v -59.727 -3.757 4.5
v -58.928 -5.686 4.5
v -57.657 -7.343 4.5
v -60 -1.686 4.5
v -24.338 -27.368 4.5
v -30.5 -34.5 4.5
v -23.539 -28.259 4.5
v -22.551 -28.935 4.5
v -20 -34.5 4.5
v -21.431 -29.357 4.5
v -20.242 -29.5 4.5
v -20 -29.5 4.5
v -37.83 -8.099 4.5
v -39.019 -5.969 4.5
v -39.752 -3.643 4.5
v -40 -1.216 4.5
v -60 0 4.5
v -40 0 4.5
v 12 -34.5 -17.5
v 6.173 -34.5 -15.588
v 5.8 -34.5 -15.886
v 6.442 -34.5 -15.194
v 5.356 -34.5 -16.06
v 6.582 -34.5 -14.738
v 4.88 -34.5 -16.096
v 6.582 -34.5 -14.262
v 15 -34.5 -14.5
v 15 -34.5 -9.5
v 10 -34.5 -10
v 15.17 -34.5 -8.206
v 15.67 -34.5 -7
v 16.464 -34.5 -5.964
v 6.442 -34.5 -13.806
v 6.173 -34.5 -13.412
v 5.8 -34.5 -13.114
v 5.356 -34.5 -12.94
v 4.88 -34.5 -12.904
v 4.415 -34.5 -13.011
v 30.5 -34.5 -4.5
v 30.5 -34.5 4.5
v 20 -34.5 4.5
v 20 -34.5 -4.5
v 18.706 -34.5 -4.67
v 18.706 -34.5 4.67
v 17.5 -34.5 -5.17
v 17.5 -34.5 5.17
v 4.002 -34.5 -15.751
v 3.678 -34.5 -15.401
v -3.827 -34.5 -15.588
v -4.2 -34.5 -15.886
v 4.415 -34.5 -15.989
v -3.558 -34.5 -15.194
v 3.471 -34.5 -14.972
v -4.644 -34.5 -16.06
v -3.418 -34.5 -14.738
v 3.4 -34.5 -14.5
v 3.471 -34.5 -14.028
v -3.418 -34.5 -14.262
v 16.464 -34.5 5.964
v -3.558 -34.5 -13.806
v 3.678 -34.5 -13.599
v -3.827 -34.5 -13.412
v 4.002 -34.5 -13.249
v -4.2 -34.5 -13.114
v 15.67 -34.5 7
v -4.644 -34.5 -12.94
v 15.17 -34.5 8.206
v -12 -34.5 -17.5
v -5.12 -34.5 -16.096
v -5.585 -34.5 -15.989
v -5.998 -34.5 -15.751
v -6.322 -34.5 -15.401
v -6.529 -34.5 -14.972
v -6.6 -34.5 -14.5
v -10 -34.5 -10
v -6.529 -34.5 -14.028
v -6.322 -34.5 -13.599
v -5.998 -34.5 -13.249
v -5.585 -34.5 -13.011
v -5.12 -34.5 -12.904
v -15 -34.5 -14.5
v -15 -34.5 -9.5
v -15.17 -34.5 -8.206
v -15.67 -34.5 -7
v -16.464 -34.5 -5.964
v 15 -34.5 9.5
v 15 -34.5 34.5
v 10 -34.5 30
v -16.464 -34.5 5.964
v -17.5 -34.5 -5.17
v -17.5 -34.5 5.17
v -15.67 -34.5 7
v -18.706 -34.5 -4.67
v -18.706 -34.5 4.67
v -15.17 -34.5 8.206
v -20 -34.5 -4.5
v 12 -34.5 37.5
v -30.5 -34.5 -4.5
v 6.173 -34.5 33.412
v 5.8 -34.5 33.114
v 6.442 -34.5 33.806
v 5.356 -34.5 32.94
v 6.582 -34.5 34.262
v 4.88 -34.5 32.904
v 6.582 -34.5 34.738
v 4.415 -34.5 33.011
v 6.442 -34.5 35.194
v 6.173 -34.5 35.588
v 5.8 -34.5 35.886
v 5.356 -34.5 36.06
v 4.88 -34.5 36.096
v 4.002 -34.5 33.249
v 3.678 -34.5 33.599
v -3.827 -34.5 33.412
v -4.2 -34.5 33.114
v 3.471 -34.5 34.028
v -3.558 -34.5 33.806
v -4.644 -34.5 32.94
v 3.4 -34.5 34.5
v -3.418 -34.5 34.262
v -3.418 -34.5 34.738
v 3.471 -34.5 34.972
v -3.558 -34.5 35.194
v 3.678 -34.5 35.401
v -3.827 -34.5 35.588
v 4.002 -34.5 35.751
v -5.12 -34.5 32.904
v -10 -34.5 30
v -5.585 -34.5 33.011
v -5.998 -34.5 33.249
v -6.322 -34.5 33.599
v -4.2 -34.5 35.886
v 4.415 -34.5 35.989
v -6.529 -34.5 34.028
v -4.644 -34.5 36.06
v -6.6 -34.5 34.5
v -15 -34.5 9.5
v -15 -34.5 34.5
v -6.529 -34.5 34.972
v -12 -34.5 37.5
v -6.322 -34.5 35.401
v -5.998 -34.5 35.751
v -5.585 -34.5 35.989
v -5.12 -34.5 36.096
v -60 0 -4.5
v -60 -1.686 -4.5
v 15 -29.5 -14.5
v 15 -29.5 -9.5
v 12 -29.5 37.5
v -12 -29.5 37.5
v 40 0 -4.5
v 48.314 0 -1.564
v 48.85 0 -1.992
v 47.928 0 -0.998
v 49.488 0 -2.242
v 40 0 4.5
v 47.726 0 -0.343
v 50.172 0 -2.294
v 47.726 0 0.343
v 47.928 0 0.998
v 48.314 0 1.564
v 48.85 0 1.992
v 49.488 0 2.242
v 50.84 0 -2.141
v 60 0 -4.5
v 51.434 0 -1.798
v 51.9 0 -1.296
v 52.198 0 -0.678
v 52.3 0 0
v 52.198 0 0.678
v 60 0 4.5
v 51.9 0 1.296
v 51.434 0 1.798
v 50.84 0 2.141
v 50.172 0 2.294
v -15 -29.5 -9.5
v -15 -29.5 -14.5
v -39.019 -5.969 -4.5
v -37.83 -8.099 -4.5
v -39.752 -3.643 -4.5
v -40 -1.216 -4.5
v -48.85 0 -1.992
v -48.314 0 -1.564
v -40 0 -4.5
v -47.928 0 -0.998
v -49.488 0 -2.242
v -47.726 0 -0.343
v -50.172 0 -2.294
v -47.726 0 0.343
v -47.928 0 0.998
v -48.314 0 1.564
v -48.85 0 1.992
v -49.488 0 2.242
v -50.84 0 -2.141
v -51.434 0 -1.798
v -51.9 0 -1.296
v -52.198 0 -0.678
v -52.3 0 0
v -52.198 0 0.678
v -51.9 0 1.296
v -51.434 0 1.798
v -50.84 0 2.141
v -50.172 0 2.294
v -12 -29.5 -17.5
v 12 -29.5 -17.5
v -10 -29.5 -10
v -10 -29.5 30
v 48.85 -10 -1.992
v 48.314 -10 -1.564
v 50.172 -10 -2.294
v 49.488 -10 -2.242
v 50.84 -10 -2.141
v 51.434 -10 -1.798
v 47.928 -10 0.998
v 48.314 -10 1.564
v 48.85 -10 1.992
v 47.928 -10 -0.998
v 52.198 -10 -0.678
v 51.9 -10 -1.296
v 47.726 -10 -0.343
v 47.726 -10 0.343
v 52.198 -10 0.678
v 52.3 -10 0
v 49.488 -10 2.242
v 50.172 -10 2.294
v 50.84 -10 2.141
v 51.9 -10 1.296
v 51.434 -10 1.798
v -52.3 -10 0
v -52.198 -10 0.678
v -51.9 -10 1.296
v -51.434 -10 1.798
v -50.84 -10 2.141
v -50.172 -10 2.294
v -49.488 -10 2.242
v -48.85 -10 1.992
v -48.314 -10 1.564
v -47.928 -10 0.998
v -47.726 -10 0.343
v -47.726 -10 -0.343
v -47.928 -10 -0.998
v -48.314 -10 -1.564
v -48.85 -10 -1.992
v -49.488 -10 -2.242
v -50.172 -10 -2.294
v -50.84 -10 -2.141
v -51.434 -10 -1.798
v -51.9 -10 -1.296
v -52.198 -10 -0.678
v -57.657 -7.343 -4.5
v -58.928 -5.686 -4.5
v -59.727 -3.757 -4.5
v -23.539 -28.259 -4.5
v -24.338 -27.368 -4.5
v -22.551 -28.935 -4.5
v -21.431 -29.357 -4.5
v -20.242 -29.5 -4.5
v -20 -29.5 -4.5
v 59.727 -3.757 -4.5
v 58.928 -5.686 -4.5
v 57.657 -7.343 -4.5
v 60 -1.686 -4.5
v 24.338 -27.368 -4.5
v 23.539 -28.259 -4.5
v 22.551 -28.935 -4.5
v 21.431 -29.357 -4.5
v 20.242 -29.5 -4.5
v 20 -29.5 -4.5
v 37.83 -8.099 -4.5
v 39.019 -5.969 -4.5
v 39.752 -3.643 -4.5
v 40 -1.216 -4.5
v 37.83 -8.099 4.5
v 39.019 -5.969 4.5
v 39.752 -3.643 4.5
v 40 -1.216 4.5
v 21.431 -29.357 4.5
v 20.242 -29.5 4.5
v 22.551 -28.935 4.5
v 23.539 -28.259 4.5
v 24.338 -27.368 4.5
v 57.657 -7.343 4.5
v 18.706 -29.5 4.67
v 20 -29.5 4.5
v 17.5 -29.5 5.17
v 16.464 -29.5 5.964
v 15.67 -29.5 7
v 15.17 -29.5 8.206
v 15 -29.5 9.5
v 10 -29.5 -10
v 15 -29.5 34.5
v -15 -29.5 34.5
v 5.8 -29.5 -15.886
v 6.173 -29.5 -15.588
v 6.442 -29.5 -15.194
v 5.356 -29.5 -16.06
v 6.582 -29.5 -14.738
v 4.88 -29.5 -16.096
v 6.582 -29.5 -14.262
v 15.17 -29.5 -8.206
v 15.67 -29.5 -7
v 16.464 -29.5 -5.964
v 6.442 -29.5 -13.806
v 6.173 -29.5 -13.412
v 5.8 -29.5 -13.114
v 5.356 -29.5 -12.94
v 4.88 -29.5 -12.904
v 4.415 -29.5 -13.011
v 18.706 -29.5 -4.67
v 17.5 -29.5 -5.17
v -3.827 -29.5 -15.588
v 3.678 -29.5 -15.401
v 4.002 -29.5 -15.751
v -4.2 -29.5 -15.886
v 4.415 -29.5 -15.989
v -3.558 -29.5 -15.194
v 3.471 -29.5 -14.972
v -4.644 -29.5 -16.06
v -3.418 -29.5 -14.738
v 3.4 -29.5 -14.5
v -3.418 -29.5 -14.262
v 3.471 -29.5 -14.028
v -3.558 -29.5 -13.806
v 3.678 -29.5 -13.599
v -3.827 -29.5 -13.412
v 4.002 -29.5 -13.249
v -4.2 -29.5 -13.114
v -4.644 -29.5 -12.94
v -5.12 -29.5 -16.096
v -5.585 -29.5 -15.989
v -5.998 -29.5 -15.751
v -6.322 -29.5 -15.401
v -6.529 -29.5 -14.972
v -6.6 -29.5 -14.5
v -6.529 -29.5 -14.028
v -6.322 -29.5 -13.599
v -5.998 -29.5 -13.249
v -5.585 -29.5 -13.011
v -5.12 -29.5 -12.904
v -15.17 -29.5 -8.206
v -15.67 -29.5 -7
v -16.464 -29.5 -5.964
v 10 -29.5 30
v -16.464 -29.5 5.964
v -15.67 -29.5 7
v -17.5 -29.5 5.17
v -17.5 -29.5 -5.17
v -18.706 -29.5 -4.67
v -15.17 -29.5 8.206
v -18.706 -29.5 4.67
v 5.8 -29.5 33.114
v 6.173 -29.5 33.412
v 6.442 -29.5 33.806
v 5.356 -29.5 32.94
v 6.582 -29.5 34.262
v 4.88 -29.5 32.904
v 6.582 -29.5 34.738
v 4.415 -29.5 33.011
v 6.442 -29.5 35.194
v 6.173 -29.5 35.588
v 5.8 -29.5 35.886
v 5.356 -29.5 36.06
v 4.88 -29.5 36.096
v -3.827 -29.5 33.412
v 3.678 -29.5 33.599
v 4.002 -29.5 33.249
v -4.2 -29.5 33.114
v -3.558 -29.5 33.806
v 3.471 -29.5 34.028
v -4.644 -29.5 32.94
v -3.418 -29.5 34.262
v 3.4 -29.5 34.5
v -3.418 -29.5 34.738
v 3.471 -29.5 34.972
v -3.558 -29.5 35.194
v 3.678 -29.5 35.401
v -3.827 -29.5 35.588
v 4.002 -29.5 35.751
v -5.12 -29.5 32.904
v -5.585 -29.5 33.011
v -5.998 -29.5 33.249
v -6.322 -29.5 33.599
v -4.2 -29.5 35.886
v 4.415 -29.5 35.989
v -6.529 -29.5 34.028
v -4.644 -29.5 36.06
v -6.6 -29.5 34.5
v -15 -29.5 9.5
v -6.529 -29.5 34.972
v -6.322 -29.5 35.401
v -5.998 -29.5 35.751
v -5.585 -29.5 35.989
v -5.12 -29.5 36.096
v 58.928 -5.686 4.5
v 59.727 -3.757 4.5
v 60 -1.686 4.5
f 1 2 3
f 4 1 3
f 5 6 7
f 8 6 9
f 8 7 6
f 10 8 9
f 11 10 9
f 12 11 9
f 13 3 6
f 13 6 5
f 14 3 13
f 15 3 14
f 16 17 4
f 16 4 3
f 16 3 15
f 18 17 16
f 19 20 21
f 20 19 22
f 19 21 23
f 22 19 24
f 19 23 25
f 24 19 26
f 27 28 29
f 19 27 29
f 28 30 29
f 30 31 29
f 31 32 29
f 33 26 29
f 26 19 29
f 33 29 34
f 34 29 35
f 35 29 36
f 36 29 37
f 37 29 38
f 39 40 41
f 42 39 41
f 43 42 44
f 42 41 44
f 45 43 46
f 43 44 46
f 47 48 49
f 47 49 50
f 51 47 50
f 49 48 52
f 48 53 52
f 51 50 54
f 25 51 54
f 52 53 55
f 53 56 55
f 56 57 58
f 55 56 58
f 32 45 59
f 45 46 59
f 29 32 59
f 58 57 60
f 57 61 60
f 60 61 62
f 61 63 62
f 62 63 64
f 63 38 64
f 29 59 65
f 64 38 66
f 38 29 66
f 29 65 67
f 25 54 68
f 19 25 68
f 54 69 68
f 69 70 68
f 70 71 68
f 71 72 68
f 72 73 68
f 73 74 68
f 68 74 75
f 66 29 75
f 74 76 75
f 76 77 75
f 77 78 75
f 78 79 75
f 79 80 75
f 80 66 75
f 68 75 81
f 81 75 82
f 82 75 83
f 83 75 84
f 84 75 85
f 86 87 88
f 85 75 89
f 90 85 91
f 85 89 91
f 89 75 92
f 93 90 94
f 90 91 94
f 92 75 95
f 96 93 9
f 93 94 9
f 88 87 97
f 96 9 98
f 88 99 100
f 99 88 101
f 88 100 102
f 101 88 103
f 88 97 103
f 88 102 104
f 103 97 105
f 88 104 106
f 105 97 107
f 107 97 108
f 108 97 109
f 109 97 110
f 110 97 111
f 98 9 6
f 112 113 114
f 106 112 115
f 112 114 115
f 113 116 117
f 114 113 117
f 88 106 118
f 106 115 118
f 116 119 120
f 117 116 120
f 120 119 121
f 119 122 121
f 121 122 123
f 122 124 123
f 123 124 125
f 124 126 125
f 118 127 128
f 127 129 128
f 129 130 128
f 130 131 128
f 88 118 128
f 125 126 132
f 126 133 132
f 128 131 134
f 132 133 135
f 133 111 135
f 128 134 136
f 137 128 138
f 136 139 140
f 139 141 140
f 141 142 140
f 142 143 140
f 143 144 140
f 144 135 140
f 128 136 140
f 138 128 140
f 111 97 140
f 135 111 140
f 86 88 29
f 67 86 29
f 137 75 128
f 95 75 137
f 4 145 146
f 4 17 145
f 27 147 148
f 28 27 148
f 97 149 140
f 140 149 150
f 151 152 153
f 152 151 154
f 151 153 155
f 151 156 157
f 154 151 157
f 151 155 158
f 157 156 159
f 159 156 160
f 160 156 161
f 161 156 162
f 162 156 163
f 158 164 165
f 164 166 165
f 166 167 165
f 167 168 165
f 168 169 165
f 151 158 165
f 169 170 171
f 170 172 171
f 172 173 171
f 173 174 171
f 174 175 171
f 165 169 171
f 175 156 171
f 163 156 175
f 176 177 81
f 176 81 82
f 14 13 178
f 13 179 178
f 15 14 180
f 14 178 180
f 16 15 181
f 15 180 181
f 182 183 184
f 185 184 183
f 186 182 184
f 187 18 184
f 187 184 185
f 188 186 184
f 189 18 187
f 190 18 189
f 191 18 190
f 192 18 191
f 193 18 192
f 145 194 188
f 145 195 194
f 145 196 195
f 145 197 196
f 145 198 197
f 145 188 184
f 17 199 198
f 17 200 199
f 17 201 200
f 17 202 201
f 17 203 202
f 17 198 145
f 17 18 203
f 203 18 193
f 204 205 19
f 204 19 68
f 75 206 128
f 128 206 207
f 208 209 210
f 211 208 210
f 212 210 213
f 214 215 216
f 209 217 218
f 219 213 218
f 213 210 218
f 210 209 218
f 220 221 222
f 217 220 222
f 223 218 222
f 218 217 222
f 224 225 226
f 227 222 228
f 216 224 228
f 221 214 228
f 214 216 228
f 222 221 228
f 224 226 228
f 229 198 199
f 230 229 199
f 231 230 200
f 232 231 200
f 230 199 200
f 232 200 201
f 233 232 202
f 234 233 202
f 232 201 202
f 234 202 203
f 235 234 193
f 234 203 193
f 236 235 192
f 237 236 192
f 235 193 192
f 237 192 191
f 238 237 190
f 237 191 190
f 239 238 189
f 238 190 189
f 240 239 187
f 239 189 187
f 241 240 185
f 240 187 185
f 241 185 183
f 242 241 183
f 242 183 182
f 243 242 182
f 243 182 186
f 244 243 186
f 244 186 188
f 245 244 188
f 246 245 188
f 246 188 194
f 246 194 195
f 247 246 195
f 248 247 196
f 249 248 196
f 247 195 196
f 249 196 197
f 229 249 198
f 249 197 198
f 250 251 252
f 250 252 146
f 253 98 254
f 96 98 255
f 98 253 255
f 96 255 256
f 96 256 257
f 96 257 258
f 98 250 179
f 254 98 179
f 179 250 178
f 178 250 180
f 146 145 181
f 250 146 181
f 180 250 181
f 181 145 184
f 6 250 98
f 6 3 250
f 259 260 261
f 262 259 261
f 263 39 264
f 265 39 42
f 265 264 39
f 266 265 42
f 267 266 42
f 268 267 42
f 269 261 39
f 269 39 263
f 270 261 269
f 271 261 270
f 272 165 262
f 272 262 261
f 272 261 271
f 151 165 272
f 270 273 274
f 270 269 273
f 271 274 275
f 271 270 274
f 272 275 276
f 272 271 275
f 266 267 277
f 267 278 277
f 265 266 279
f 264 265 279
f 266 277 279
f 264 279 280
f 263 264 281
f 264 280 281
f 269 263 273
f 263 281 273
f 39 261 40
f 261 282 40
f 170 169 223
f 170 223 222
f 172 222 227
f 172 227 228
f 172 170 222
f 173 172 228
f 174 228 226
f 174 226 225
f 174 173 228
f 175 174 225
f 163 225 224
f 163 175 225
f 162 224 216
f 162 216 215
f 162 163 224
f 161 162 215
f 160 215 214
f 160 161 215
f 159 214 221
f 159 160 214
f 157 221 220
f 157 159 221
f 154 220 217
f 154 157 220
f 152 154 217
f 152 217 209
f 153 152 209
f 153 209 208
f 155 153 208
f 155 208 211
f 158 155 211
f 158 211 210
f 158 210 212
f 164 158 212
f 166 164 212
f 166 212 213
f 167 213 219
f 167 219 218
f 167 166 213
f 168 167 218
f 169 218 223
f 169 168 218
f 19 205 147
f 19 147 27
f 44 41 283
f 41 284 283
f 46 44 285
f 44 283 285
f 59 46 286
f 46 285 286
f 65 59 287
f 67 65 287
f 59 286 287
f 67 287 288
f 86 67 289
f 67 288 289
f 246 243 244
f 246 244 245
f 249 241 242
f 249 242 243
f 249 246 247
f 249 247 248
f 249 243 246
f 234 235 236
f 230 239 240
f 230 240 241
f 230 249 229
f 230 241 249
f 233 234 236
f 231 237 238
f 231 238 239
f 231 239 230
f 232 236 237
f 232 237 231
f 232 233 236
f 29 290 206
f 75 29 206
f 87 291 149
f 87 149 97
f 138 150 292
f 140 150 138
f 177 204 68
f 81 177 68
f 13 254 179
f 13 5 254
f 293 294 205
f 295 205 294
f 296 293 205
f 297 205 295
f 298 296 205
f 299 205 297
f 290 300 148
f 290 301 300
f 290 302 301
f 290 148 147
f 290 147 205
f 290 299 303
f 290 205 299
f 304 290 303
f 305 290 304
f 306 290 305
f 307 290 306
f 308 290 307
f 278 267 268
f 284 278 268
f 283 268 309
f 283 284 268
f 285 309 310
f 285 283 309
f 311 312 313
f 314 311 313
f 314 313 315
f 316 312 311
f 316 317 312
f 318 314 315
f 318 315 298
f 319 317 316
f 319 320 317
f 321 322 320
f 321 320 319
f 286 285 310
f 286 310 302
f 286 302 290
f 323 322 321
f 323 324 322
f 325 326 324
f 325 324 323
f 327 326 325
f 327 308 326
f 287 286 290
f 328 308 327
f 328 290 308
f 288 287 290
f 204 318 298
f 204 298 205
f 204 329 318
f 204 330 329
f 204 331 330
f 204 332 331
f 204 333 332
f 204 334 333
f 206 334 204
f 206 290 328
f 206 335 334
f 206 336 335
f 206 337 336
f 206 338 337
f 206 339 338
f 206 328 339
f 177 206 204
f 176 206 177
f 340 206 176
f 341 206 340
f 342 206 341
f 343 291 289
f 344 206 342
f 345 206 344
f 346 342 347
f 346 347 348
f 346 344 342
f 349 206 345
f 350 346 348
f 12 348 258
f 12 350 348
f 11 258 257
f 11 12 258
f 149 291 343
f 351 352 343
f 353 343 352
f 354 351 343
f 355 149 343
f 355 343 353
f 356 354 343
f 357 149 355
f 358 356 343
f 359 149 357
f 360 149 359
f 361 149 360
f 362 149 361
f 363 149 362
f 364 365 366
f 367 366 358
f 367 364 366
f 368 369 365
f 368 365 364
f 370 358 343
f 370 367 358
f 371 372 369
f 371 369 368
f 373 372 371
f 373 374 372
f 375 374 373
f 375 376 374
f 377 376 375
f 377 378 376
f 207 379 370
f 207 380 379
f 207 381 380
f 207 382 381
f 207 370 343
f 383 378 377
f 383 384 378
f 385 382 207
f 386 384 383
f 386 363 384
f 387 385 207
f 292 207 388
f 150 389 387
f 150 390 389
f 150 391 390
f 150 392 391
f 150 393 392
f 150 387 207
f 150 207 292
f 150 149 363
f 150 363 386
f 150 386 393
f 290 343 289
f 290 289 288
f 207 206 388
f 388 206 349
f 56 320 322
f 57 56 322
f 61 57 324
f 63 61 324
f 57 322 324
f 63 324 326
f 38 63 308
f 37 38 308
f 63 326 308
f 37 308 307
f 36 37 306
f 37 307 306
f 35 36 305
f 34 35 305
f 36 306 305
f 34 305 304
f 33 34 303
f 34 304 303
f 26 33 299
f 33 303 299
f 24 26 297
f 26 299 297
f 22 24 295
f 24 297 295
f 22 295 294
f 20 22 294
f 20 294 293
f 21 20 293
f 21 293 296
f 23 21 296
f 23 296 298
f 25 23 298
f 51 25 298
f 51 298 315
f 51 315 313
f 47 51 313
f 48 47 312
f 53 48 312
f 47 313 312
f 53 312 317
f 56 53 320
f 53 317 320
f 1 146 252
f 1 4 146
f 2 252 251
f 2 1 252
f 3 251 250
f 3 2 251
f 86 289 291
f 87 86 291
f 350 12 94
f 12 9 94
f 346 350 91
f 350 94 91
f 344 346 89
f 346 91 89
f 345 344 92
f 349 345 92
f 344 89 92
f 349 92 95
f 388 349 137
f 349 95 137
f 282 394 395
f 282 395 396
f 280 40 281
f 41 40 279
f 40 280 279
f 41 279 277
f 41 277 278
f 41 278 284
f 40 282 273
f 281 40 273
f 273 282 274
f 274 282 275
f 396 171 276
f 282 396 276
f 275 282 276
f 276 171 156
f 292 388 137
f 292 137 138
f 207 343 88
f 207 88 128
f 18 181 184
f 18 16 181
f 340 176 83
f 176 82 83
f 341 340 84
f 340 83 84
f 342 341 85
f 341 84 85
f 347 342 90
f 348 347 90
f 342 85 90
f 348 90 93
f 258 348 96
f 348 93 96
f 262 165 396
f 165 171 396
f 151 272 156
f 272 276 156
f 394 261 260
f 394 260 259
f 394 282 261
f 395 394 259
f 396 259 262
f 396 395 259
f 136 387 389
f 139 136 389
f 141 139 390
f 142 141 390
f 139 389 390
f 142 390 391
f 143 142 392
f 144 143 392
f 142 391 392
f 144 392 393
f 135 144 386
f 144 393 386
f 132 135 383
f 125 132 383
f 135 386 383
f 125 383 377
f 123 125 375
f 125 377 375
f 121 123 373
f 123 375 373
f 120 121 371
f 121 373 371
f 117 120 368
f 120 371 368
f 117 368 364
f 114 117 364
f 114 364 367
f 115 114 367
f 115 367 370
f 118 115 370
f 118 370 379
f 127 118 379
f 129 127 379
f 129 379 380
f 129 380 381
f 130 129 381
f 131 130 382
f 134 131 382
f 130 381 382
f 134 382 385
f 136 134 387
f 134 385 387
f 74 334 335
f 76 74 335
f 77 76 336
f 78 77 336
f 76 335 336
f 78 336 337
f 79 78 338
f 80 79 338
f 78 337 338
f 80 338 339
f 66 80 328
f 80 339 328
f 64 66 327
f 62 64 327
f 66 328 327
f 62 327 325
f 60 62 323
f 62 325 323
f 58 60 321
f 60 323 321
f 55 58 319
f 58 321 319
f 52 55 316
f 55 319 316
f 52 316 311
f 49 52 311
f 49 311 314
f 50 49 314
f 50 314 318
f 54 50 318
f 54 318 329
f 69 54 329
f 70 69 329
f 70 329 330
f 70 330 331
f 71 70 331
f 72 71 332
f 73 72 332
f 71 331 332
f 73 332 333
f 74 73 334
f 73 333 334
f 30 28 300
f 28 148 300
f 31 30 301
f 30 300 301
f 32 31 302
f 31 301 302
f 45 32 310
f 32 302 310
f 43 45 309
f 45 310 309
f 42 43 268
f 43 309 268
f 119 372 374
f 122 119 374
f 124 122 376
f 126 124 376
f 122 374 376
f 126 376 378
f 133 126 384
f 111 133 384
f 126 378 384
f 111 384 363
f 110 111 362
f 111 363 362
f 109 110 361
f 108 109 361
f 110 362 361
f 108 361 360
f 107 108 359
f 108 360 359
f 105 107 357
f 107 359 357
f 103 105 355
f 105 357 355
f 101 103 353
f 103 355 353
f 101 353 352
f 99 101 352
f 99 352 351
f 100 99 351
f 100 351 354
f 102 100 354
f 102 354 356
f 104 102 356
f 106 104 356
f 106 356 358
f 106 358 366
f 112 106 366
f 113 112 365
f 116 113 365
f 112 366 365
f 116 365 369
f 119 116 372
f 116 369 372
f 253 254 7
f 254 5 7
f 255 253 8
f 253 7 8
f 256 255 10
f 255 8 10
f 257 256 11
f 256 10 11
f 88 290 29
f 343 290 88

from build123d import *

# Parameters (mm, degrees)
PAD005_DEPTH    = 4.5
SKETCH013_R     = 2.3
POCKET009_DEPTH = 10
SKETCH014_W     = 30
SKETCH014_H     = 55
SKETCH014_R     = 1.6
SKETCH014_W_2   = 20
SKETCH014_H_2   = 40
PAD006_DEPTH    = 5
FILLET007_R     = 12
FILLET008_R     = 5
FILLET009_R     = 8
CHAMFER009_SIZE = 3
FILLET010_R     = 5


with BuildPart() as part:
    # Sketch012 → Pad005 (new body, symmetric)
    with BuildSketch(Plane.XY):
        Polygon((-60, 0), (-60, -5), (-30.5, -34.5), (-10, -34.5), (-10, -29.5), (-22.844915, -29.5), (-40, -5), (-40, 0), align=None)
    pad005 = extrude(amount=PAD005_DEPTH, both=True)

    # Sketch013 (on Face8 of Pad005) → Pocket009 (cut)
    with BuildSketch(Plane(origin=(0, 0, 0), x_dir=(-1, 0, 0), z_dir=(0, 1, 0))):
        with Locations((50, 0)):
            Circle(SKETCH013_R)
    pocket009 = extrude(amount=-POCKET009_DEPTH, mode=Mode.SUBTRACT)

    # Mirrored001: Pad005, Pocket009 across YZ
    add(pad005.mirror(Plane.YZ))
    add(pocket009.mirror(Plane.YZ), mode=Mode.SUBTRACT)

    # Sketch014 (on Face10 of Mirrored001) → Pad006 (join)
    with BuildSketch(Plane(origin=(0, -29.5, 0), x_dir=(-1, 0, 0), z_dir=(0, 1, 0))):
        with Locations((0, 10)):
            Rectangle(SKETCH014_W, SKETCH014_H)
        with Locations((5, 34.5)):
            Circle(SKETCH014_R, mode=Mode.SUBTRACT)
        with Locations((-5, 34.5)):
            Circle(SKETCH014_R, mode=Mode.SUBTRACT)
        with Locations((5, -14.5)):
            Circle(SKETCH014_R, mode=Mode.SUBTRACT)
        with Locations((-5, -14.5)):
            Circle(SKETCH014_R, mode=Mode.SUBTRACT)
        with Locations((0, 10)):
            Rectangle(SKETCH014_W_2, SKETCH014_H_2, mode=Mode.SUBTRACT)
    extrude(amount=-PAD006_DEPTH)

    # Fillet007
    fillet007_edges = [part.edges().sort_by_distance(p)[0] for p in [
        (-40, -5, 0),
        (40, -5, 0),
    ]]
    fillet(fillet007_edges, radius=FILLET007_R)

    # Fillet008
    fillet008_edges = [part.edges().sort_by_distance(p)[0] for p in [
        (22.844915, -29.5, 0),
        (-22.844915, -29.5, 0),
    ]]
    fillet(fillet008_edges, radius=FILLET008_R)

    # Fillet009
    fillet009_edges = [part.edges().sort_by_distance(p)[0] for p in [
        (60, -5, 0),
        (-60, -5, 0),
    ]]
    fillet(fillet009_edges, radius=FILLET009_R)

    # Chamfer009
    chamfer009_edges = [part.edges().sort_by_distance(p)[0] for p in [
        (15, -32, -17.5),
        (-15, -32, -17.5),
        (15, -32, 37.5),
        (-15, -32, 37.5),
    ]]
    chamfer(chamfer009_edges, length=CHAMFER009_SIZE)

    # Fillet010
    fillet010_edges = [part.edges().sort_by_distance(p)[0] for p in [
        (15, -32, 4.5),
        (15, -32, -4.5),
        (-15, -32, 4.5),
        (-15, -32, -4.5),
    ]]
    fillet(fillet010_edges, radius=FILLET010_R)


solid = part.part
